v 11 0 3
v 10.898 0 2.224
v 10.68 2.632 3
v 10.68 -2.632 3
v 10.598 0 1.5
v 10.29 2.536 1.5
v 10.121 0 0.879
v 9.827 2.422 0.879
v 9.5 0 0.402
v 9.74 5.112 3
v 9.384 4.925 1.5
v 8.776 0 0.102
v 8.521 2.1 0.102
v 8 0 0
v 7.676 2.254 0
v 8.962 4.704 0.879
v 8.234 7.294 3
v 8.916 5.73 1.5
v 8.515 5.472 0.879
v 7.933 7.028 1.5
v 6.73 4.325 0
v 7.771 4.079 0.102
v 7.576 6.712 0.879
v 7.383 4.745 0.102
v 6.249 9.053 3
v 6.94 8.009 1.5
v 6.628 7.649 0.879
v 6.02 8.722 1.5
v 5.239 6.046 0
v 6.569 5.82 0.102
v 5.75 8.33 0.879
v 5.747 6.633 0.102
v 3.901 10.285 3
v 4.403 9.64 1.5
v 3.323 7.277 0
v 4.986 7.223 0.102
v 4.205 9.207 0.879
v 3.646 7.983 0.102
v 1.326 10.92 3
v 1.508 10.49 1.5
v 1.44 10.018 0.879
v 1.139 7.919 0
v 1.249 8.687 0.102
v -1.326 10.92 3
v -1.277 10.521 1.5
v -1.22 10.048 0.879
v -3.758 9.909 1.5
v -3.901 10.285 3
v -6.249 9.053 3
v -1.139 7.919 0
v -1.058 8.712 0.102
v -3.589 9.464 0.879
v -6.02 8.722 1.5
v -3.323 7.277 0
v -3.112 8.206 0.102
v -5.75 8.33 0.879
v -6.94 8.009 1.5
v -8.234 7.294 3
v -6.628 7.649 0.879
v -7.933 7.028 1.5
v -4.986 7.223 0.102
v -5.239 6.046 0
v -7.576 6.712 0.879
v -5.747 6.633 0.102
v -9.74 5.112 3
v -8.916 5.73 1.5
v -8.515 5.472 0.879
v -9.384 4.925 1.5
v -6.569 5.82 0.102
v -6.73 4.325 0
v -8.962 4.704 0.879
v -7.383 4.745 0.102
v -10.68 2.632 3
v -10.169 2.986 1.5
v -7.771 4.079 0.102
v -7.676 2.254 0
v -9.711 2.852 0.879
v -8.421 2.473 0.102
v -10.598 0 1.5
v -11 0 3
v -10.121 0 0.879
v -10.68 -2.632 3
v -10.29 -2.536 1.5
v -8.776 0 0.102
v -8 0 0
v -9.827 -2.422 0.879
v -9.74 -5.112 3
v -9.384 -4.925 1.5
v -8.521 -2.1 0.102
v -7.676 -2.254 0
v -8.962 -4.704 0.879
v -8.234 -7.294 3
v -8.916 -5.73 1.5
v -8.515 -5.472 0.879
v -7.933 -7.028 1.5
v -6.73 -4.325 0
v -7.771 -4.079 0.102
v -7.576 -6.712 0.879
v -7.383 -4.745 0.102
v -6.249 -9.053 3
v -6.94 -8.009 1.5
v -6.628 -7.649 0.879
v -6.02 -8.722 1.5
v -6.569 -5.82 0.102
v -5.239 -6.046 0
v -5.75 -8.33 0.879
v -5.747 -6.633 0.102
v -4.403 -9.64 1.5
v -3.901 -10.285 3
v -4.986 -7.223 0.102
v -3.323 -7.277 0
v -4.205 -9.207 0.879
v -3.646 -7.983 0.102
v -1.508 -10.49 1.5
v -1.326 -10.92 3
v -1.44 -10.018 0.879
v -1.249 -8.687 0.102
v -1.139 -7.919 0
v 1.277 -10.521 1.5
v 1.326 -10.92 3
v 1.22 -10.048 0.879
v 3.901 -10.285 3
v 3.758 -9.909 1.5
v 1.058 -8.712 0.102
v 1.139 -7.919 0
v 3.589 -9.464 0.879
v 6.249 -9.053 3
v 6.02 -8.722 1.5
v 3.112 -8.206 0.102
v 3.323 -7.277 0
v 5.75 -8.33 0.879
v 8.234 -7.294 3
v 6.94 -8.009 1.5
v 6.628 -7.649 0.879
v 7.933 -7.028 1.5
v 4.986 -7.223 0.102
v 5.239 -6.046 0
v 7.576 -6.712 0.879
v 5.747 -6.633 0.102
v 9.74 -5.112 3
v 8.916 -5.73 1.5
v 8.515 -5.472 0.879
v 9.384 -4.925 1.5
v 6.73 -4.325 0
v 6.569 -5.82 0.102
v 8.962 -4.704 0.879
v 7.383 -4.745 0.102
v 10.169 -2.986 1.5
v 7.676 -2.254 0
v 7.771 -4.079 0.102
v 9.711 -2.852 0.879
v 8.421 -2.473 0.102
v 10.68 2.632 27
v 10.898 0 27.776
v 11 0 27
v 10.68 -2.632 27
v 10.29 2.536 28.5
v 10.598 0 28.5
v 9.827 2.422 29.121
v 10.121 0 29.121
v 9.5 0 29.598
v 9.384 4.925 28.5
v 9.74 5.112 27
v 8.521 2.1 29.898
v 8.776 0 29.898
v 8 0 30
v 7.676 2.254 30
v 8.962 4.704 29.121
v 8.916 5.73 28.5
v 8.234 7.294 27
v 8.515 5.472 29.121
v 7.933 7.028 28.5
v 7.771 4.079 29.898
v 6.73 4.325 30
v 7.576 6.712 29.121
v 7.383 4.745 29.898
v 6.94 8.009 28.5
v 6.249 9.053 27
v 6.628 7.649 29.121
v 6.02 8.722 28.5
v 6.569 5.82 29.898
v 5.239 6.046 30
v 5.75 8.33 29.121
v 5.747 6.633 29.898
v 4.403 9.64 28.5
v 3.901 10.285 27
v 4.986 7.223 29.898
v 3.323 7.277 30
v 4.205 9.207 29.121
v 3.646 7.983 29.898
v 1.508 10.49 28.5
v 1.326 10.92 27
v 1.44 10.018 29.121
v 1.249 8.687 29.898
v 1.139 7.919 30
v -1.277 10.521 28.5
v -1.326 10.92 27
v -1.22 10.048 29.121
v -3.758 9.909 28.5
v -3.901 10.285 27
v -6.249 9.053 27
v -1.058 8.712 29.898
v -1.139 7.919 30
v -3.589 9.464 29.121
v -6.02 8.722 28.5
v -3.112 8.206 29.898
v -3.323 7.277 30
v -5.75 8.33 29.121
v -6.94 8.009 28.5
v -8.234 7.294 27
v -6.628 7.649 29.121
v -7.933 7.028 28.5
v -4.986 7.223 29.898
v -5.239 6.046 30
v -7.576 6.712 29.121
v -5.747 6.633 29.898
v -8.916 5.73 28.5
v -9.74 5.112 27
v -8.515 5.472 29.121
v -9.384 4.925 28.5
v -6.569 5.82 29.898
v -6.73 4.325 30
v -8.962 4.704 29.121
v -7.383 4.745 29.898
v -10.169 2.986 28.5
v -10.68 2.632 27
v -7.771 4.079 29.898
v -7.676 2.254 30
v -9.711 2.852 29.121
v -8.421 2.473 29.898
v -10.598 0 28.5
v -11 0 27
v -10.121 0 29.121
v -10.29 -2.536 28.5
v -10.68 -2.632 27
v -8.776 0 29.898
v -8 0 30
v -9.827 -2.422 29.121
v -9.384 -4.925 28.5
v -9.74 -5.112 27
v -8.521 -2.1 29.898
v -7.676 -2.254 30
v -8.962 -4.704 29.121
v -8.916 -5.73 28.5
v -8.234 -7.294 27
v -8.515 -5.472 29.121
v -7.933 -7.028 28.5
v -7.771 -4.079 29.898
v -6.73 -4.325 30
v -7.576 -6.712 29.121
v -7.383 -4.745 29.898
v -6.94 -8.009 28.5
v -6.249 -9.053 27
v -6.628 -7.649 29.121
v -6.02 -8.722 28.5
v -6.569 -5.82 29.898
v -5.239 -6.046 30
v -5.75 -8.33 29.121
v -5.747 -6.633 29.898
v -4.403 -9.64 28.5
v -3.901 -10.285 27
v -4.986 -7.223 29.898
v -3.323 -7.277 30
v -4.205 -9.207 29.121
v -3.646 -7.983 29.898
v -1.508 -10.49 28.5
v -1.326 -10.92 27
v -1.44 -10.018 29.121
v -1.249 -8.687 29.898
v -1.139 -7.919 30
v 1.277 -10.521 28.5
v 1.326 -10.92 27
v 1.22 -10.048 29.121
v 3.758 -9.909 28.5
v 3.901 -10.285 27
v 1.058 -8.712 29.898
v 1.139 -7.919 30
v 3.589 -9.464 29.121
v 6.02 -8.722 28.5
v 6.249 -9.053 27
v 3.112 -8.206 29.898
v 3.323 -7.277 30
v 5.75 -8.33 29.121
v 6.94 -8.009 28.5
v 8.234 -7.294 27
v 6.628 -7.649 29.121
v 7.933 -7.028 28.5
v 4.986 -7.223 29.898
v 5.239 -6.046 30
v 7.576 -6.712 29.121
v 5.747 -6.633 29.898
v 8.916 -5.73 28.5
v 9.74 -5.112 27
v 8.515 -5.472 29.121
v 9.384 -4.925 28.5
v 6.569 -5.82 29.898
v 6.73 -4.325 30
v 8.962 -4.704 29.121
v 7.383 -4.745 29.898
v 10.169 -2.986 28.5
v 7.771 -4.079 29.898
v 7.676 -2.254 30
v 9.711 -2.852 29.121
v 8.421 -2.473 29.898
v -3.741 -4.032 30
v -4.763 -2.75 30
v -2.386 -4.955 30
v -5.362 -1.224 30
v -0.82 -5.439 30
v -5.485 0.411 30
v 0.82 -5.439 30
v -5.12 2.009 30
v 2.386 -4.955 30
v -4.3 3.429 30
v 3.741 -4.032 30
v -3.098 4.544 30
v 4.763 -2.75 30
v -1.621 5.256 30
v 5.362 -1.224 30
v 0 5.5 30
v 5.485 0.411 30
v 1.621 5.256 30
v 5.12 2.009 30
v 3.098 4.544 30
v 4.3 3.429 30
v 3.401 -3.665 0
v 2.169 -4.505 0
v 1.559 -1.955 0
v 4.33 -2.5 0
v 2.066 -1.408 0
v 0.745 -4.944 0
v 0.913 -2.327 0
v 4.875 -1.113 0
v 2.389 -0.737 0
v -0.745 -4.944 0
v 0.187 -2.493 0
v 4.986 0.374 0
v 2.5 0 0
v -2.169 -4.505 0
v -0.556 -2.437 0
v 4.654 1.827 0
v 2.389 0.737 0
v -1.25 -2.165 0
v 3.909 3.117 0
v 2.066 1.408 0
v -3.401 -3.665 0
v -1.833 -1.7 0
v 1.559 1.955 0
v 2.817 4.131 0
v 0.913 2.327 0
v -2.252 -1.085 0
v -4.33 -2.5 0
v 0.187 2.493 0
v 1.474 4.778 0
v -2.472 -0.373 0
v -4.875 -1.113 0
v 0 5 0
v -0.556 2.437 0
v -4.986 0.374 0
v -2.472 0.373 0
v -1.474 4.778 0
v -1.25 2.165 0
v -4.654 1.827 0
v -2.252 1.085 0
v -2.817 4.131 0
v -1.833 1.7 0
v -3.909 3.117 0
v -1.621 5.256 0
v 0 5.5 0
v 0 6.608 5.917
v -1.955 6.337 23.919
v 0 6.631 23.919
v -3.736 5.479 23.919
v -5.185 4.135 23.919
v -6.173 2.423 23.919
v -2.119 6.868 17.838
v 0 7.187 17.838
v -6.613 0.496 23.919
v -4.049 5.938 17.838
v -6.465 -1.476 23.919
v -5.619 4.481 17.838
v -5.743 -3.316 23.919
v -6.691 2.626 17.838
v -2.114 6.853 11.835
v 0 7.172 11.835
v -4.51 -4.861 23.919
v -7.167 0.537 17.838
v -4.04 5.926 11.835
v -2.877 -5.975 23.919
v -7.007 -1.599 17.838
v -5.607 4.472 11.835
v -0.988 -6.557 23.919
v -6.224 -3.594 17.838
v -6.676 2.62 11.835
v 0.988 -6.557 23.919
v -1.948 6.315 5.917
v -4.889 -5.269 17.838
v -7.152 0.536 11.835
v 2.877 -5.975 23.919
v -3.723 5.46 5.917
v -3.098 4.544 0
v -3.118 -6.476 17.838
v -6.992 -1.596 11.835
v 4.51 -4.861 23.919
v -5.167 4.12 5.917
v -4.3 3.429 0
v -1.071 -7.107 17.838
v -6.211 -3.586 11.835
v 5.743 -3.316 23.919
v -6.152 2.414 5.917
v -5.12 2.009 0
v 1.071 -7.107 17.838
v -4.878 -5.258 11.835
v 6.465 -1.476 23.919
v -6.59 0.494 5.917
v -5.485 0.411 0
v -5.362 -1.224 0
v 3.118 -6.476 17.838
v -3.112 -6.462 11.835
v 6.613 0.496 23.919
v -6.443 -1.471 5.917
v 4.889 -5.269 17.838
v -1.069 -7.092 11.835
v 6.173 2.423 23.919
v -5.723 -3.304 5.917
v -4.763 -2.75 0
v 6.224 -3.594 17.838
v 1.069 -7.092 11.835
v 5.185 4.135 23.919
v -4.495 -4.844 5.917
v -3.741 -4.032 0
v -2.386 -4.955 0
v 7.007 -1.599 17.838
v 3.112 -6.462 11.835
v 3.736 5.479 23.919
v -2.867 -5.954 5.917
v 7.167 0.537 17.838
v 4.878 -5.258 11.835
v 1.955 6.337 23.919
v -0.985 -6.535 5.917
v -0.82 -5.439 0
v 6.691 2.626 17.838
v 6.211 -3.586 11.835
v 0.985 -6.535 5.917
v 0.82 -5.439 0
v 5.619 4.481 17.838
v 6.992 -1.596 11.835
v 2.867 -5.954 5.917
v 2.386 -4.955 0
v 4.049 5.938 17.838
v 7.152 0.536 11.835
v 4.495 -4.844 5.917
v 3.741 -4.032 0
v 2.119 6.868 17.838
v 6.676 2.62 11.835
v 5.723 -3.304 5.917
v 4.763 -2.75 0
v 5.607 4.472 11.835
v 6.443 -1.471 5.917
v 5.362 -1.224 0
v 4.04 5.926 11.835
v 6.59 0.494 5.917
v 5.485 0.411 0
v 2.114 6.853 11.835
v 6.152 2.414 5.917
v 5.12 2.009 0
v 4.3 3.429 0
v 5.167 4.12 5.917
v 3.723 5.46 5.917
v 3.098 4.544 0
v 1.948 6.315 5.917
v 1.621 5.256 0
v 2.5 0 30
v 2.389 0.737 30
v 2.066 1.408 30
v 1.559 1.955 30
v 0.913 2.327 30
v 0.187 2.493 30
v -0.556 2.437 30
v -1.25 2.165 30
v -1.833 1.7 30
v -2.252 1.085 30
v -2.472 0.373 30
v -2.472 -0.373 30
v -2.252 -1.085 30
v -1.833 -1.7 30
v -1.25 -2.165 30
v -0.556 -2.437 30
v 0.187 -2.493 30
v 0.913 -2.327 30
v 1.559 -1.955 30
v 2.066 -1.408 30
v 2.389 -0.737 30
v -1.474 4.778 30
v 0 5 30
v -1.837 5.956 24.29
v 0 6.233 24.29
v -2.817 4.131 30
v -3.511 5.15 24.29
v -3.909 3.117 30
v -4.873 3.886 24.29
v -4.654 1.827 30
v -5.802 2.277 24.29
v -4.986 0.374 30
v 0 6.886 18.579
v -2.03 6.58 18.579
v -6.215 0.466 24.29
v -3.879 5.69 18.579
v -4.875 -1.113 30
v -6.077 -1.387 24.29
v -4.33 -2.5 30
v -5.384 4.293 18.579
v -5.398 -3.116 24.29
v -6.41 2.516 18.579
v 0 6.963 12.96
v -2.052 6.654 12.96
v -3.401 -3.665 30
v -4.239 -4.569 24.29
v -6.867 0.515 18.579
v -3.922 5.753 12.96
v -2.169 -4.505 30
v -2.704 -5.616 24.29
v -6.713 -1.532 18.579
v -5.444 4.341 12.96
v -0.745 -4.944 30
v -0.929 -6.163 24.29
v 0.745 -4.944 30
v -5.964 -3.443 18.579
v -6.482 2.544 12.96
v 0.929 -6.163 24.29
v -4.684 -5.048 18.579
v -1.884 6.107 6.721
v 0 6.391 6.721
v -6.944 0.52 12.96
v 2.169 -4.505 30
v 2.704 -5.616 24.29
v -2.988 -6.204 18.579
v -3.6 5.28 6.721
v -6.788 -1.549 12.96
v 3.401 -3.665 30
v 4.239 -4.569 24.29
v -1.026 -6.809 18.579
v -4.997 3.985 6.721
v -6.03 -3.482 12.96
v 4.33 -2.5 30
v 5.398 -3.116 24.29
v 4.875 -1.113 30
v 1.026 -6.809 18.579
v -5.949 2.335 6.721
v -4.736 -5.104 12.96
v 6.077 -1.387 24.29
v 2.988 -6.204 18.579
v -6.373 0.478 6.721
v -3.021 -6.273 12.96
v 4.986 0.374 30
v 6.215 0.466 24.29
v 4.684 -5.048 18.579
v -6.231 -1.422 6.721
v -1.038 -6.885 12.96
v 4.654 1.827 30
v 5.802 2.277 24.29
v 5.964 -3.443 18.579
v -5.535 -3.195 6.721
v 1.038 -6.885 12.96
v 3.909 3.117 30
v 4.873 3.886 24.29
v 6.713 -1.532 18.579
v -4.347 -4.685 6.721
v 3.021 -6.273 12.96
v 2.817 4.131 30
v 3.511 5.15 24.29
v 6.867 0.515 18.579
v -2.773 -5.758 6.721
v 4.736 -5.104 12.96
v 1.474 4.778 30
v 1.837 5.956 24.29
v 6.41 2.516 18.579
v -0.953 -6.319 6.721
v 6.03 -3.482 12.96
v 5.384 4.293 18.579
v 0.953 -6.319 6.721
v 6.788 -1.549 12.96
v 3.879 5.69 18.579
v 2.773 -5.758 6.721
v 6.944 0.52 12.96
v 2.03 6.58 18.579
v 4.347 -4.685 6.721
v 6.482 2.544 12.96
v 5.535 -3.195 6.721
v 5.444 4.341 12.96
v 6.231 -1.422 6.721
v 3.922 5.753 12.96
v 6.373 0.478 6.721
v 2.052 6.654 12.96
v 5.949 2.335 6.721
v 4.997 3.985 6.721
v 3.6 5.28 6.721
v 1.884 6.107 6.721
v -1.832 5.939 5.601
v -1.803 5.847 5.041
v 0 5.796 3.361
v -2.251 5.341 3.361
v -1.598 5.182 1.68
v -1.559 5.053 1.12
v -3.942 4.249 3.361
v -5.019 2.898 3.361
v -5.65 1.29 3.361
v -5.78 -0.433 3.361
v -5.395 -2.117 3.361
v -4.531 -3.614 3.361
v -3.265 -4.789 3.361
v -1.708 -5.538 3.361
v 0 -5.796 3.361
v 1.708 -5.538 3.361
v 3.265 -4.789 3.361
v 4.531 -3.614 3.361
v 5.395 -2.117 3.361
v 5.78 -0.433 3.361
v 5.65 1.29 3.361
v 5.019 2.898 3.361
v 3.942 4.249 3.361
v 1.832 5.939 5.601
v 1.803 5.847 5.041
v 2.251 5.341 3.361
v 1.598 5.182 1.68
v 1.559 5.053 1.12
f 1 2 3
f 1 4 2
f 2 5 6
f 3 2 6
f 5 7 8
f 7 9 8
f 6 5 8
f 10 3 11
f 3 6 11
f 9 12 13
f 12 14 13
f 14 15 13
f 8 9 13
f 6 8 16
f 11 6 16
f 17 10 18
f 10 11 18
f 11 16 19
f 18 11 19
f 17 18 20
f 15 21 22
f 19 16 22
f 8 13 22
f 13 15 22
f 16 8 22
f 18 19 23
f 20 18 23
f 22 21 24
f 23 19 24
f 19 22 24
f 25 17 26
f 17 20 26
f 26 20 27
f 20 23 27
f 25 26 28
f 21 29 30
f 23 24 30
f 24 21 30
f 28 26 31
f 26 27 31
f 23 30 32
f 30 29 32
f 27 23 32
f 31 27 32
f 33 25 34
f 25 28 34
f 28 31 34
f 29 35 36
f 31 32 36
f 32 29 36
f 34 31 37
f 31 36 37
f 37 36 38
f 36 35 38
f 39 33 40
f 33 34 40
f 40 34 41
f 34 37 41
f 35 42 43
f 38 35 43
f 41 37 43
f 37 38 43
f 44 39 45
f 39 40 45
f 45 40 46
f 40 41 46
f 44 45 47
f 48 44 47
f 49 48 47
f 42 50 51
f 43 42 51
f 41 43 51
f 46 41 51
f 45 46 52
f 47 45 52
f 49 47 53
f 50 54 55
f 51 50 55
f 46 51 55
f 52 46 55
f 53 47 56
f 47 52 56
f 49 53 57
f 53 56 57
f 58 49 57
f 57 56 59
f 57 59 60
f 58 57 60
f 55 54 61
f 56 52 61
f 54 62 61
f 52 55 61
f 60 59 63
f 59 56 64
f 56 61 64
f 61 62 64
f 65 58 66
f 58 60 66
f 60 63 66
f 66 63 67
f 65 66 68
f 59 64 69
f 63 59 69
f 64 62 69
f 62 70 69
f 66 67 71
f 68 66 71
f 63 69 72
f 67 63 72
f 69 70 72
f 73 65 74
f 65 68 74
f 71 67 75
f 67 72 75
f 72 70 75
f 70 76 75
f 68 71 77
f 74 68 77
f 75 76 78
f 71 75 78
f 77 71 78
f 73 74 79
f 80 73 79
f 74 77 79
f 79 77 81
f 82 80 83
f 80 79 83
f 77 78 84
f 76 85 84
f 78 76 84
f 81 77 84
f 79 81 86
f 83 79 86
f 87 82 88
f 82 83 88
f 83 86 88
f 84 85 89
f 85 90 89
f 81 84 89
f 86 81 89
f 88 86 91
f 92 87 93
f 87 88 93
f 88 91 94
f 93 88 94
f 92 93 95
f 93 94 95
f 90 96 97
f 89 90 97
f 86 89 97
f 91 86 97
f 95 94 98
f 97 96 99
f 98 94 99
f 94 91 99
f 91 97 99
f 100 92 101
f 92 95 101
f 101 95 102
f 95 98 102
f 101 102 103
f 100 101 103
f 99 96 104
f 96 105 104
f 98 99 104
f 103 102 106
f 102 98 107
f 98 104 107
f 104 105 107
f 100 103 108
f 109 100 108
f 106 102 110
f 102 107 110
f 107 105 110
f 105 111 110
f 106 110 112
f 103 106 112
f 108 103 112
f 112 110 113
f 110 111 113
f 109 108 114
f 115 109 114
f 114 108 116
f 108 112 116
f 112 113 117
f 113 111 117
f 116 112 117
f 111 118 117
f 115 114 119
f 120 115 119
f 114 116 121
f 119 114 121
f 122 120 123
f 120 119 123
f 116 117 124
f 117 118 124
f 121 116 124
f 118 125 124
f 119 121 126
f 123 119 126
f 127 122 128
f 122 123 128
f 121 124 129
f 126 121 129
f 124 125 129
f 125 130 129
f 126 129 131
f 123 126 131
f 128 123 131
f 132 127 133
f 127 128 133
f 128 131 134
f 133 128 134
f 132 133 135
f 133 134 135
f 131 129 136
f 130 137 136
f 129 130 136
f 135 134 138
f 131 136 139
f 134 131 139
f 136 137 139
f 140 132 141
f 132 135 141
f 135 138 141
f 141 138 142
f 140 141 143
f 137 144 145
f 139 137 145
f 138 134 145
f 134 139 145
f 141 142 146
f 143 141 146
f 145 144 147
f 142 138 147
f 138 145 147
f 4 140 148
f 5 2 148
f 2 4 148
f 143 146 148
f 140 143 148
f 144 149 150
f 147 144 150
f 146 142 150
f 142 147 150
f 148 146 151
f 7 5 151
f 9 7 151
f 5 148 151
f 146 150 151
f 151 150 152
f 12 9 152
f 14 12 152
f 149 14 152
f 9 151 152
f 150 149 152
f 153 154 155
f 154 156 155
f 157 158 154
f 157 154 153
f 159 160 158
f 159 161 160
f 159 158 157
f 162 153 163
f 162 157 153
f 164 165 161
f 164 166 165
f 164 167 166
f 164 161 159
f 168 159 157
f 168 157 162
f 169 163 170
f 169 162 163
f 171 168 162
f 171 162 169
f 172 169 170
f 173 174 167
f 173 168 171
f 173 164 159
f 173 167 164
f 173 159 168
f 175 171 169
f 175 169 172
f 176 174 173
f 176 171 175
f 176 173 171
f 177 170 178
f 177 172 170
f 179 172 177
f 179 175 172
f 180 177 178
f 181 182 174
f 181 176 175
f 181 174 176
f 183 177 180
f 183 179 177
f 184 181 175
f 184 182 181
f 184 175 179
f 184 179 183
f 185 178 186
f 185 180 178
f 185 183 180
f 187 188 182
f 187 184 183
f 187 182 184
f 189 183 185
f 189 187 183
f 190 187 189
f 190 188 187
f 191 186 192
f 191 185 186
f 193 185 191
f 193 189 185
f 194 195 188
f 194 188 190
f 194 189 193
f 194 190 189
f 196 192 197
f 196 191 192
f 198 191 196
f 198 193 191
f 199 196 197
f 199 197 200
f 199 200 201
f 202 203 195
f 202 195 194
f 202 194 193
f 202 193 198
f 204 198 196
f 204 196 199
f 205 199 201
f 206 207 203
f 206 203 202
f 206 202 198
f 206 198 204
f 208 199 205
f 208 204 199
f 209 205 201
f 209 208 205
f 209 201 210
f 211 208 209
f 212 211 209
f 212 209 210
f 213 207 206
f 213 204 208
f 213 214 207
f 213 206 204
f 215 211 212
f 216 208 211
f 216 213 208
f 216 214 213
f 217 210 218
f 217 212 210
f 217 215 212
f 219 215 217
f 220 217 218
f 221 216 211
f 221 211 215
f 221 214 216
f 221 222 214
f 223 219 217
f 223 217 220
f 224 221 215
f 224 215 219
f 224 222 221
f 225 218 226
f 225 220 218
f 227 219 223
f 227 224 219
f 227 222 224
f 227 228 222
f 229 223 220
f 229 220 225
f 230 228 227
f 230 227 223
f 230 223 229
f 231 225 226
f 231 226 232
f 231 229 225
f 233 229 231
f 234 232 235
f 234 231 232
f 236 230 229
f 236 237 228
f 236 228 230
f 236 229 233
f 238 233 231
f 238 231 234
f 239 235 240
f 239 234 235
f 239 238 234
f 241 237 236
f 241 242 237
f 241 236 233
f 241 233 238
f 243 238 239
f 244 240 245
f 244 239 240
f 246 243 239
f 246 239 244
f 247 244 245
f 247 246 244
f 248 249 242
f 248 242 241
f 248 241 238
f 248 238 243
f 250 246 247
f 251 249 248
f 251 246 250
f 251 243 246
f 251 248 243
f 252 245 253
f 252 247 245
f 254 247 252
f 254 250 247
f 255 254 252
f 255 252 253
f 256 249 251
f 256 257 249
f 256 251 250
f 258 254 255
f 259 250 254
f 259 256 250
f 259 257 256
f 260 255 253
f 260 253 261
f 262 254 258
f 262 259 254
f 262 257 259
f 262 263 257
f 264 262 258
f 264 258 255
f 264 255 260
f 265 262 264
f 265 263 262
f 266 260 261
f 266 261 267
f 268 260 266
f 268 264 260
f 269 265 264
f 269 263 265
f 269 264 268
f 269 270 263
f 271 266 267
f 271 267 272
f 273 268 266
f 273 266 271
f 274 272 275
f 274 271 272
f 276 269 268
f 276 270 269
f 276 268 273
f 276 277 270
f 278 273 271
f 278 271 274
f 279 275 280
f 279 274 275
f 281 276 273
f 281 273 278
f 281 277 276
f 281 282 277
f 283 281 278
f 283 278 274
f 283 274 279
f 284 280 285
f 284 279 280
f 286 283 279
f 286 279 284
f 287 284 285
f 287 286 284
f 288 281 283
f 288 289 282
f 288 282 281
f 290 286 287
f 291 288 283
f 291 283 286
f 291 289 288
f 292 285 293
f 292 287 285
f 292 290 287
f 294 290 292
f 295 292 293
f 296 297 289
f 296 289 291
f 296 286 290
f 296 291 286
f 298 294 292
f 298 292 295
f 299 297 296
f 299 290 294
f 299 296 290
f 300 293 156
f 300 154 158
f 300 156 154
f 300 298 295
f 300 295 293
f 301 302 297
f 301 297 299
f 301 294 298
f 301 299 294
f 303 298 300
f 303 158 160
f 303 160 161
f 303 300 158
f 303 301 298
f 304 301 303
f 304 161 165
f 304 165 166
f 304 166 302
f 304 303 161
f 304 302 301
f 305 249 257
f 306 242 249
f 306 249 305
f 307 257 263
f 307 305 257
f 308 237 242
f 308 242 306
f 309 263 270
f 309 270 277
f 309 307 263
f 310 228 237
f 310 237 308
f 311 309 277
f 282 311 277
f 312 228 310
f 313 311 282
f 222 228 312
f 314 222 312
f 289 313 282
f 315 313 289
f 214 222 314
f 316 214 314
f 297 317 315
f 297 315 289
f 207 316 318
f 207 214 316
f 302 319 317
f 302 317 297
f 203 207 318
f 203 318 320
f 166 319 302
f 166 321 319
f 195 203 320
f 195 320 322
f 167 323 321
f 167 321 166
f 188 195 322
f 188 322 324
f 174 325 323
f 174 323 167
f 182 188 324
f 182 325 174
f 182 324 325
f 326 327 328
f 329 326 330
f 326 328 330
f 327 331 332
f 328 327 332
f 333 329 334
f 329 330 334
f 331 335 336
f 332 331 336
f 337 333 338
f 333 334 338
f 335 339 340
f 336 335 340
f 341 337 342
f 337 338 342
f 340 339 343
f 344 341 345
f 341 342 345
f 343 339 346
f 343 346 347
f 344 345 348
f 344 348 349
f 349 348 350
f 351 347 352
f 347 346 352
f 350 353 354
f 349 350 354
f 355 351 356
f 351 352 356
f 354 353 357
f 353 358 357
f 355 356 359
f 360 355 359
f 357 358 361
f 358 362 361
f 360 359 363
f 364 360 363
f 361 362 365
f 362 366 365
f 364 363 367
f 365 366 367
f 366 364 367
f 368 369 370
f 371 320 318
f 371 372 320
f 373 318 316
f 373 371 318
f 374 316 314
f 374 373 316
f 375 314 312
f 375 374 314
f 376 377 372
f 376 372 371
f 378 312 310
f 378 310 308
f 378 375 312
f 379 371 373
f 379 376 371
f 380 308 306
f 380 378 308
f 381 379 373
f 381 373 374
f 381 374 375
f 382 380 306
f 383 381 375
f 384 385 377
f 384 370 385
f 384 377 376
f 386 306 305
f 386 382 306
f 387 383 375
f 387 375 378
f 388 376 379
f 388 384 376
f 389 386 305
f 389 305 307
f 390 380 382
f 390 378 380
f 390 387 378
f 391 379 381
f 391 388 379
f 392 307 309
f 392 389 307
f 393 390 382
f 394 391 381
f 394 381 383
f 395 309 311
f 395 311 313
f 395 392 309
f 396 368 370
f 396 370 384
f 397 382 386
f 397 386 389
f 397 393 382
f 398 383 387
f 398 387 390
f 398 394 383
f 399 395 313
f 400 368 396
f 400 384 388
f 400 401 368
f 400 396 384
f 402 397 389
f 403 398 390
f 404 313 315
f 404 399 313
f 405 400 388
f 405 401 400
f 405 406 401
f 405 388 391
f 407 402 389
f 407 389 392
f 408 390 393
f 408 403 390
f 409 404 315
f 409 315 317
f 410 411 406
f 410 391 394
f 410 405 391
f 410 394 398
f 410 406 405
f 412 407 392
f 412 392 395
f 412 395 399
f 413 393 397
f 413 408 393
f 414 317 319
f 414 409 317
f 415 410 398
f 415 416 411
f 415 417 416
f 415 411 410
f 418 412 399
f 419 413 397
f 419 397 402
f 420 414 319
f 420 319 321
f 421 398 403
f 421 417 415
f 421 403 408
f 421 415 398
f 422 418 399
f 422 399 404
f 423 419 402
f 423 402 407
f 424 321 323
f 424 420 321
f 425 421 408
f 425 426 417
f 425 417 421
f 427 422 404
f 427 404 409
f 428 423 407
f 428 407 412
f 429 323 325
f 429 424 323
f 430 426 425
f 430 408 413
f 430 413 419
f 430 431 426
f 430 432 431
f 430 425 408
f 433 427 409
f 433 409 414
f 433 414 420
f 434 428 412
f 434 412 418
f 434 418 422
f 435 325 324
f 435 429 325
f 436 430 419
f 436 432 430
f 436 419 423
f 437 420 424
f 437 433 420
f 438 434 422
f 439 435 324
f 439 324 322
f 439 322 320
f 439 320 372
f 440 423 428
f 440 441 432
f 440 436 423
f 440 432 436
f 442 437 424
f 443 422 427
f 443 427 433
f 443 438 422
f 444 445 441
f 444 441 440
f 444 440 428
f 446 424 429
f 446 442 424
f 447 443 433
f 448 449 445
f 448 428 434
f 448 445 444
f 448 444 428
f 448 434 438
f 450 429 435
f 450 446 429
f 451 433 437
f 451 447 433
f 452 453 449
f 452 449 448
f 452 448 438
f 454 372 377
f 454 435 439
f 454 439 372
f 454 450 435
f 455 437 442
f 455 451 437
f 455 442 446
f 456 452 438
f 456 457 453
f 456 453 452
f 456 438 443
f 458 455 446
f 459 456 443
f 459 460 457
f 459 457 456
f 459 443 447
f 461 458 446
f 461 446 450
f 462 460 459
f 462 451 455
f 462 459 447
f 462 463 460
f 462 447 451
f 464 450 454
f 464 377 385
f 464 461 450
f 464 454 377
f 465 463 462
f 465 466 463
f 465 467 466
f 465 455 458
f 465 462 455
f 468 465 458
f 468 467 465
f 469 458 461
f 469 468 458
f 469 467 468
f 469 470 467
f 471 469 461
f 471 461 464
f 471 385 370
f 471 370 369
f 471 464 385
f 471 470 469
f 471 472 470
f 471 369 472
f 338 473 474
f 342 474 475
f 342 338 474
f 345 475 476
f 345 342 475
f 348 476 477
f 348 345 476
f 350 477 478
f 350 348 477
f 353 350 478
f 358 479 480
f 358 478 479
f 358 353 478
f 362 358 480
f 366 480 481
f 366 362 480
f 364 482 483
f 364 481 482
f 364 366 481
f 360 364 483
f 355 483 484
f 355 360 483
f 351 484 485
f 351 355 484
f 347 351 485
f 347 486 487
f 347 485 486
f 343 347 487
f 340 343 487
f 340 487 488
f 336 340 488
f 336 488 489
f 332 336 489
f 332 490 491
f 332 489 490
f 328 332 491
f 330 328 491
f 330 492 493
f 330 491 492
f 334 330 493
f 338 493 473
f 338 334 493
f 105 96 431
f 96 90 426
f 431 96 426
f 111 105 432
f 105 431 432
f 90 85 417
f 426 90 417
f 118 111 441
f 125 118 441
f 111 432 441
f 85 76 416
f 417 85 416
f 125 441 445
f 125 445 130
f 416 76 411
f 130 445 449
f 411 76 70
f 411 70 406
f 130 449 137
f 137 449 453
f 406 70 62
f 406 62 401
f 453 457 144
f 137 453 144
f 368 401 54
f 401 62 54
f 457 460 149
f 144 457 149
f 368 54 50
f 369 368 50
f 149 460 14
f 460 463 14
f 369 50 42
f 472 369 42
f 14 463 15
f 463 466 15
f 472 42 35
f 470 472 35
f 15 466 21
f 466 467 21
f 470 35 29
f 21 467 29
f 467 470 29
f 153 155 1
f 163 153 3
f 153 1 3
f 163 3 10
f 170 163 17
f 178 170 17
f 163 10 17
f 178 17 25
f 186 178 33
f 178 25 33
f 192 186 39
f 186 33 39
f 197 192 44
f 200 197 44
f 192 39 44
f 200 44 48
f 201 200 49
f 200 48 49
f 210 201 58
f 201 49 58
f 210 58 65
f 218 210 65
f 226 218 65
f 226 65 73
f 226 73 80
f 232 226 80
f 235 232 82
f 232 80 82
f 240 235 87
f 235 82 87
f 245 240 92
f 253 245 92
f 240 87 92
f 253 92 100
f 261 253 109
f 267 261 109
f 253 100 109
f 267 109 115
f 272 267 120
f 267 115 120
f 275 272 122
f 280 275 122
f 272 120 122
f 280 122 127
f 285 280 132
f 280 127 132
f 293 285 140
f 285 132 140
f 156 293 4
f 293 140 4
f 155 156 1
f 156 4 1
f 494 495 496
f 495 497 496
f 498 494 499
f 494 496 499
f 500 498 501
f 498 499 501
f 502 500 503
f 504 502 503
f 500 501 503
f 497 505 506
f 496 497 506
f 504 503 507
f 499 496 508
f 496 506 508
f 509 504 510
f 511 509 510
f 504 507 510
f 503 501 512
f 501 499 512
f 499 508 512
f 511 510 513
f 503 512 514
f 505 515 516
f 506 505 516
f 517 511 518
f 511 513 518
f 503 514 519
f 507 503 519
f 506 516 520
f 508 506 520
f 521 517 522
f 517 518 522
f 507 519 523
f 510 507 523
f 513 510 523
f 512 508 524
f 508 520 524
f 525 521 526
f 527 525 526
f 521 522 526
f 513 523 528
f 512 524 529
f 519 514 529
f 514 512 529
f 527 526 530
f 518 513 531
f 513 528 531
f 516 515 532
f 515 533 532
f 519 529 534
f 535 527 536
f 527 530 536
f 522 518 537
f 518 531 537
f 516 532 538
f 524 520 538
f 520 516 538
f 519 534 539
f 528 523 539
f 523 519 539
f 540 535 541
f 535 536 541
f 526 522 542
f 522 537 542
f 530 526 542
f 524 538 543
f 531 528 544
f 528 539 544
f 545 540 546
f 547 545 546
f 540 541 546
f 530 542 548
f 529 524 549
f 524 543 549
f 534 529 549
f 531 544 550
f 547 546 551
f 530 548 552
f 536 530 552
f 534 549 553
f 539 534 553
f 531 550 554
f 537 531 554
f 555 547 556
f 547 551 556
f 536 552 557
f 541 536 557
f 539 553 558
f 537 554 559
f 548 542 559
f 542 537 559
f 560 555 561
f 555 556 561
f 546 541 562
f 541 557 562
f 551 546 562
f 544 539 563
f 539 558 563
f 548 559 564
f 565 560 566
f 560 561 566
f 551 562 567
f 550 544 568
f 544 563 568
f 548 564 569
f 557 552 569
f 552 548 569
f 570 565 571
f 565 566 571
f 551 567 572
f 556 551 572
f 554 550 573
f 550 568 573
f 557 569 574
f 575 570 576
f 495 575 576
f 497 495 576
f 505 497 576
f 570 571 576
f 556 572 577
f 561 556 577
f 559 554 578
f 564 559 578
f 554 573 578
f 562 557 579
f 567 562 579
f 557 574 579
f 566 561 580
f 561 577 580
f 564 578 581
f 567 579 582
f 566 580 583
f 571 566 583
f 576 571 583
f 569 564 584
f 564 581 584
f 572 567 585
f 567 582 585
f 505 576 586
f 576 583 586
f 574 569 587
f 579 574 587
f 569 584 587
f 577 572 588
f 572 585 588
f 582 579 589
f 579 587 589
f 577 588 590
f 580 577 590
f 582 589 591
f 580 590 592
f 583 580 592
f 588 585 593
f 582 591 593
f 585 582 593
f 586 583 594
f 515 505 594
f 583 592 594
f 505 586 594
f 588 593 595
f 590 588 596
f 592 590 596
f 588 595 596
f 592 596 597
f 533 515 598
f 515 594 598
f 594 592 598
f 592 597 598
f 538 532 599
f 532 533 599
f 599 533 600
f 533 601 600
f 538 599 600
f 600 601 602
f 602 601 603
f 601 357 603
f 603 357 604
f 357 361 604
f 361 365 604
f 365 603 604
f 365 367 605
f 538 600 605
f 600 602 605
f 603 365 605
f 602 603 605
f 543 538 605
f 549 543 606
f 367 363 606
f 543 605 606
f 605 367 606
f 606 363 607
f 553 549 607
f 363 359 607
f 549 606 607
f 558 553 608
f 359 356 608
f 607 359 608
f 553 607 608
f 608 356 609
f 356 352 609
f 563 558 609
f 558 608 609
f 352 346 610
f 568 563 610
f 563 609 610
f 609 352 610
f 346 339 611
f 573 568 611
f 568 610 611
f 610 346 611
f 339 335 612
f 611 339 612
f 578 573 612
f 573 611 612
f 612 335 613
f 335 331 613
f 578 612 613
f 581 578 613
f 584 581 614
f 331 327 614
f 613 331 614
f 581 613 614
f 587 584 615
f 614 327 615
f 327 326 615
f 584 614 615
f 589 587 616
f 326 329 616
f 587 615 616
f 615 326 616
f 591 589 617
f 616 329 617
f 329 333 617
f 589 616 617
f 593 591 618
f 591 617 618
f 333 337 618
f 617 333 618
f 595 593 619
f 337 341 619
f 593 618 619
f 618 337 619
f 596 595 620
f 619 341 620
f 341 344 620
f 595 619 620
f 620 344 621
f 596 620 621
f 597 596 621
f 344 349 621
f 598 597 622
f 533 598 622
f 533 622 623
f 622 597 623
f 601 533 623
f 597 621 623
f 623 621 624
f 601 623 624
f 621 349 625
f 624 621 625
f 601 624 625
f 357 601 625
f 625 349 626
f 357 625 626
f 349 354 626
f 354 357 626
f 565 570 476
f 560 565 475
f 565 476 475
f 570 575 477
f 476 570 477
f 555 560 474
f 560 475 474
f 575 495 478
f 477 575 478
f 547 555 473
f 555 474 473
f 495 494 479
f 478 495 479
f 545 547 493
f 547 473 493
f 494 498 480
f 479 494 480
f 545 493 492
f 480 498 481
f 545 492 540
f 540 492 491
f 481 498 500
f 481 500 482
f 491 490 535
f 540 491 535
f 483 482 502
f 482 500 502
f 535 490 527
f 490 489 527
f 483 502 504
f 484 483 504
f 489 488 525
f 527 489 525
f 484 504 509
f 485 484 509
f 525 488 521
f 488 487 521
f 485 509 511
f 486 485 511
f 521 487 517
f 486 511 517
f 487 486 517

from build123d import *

# Parameters (mm, degrees)
SKETCH_R     = 11
PAD_DEPTH    = 0.01
SKETCH001_R  = 11
SKETCH002_R  = 11
SKETCH005_R  = 2.5
POCKET_DEPTH = 50
FILLET_R     = 3


with BuildPart() as part:
    # Sketch (on XY_Plane of Origin) → Pad (new body)
    with BuildSketch(Plane.XY):
        Circle(SKETCH_R)
    extrude(amount=PAD_DEPTH)

    # Sketch001 (on XY_Plane of Origin) → AdditiveLoft section 0
    with BuildSketch(Plane.XY):
        Circle(SKETCH001_R)
    # Sketch002 (on Sketch) → AdditiveLoft section 1
    with BuildSketch(Plane.XY.offset(30)):
        Circle(SKETCH002_R)
    loft()

    # Sketch003 (on YZ_Plane of Origin) → Groove (revolve, cut)
    with BuildSketch(Plane.YZ):
        with BuildLine():
            Line((0, 0), (0, 30))
            Line((0, 30), (5.5, 30))
            add(Edge.make_bspline(
                [(5.5, 30), (9, 15), (5.5, 0)],
                knots=[0, 0, 0, 1, 1, 1], degree=2))
            Line((5.5, 0), (0, 0))
        make_face()
    revolve(axis=Axis((0, 0, 0), (0, 0, 1)), mode=Mode.SUBTRACT)

    # Sketch004 (on YZ_Plane of Origin) → Revolution (revolve)
    with BuildSketch(Plane.YZ):
        with BuildLine():
            Line((0, 0), (0, 30))
            Line((0, 30), (5, 30))
            add(Edge.make_bspline(
                [(5, 30), (9, 15), (5, 0)],
                knots=[0, 0, 0, 1, 1, 1], degree=2))
            Line((5, 0), (0, 0))
        make_face()
    revolve(axis=Axis((0, 0, 0), (0, 0, 1)))

    # Sketch005 (on XY_Plane of Origin) → Pocket (cut)
    with BuildSketch(Plane.XY):
        Circle(SKETCH005_R)
    extrude(amount=POCKET_DEPTH, mode=Mode.SUBTRACT)

    # Fillet
    fillet_edges = [part.edges().sort_by_distance(p)[0] for p in [
        (-11, 0, 0),
        (-11, 0, 30),
    ]]
    fillet(fillet_edges, radius=FILLET_R)


solid = part.part
